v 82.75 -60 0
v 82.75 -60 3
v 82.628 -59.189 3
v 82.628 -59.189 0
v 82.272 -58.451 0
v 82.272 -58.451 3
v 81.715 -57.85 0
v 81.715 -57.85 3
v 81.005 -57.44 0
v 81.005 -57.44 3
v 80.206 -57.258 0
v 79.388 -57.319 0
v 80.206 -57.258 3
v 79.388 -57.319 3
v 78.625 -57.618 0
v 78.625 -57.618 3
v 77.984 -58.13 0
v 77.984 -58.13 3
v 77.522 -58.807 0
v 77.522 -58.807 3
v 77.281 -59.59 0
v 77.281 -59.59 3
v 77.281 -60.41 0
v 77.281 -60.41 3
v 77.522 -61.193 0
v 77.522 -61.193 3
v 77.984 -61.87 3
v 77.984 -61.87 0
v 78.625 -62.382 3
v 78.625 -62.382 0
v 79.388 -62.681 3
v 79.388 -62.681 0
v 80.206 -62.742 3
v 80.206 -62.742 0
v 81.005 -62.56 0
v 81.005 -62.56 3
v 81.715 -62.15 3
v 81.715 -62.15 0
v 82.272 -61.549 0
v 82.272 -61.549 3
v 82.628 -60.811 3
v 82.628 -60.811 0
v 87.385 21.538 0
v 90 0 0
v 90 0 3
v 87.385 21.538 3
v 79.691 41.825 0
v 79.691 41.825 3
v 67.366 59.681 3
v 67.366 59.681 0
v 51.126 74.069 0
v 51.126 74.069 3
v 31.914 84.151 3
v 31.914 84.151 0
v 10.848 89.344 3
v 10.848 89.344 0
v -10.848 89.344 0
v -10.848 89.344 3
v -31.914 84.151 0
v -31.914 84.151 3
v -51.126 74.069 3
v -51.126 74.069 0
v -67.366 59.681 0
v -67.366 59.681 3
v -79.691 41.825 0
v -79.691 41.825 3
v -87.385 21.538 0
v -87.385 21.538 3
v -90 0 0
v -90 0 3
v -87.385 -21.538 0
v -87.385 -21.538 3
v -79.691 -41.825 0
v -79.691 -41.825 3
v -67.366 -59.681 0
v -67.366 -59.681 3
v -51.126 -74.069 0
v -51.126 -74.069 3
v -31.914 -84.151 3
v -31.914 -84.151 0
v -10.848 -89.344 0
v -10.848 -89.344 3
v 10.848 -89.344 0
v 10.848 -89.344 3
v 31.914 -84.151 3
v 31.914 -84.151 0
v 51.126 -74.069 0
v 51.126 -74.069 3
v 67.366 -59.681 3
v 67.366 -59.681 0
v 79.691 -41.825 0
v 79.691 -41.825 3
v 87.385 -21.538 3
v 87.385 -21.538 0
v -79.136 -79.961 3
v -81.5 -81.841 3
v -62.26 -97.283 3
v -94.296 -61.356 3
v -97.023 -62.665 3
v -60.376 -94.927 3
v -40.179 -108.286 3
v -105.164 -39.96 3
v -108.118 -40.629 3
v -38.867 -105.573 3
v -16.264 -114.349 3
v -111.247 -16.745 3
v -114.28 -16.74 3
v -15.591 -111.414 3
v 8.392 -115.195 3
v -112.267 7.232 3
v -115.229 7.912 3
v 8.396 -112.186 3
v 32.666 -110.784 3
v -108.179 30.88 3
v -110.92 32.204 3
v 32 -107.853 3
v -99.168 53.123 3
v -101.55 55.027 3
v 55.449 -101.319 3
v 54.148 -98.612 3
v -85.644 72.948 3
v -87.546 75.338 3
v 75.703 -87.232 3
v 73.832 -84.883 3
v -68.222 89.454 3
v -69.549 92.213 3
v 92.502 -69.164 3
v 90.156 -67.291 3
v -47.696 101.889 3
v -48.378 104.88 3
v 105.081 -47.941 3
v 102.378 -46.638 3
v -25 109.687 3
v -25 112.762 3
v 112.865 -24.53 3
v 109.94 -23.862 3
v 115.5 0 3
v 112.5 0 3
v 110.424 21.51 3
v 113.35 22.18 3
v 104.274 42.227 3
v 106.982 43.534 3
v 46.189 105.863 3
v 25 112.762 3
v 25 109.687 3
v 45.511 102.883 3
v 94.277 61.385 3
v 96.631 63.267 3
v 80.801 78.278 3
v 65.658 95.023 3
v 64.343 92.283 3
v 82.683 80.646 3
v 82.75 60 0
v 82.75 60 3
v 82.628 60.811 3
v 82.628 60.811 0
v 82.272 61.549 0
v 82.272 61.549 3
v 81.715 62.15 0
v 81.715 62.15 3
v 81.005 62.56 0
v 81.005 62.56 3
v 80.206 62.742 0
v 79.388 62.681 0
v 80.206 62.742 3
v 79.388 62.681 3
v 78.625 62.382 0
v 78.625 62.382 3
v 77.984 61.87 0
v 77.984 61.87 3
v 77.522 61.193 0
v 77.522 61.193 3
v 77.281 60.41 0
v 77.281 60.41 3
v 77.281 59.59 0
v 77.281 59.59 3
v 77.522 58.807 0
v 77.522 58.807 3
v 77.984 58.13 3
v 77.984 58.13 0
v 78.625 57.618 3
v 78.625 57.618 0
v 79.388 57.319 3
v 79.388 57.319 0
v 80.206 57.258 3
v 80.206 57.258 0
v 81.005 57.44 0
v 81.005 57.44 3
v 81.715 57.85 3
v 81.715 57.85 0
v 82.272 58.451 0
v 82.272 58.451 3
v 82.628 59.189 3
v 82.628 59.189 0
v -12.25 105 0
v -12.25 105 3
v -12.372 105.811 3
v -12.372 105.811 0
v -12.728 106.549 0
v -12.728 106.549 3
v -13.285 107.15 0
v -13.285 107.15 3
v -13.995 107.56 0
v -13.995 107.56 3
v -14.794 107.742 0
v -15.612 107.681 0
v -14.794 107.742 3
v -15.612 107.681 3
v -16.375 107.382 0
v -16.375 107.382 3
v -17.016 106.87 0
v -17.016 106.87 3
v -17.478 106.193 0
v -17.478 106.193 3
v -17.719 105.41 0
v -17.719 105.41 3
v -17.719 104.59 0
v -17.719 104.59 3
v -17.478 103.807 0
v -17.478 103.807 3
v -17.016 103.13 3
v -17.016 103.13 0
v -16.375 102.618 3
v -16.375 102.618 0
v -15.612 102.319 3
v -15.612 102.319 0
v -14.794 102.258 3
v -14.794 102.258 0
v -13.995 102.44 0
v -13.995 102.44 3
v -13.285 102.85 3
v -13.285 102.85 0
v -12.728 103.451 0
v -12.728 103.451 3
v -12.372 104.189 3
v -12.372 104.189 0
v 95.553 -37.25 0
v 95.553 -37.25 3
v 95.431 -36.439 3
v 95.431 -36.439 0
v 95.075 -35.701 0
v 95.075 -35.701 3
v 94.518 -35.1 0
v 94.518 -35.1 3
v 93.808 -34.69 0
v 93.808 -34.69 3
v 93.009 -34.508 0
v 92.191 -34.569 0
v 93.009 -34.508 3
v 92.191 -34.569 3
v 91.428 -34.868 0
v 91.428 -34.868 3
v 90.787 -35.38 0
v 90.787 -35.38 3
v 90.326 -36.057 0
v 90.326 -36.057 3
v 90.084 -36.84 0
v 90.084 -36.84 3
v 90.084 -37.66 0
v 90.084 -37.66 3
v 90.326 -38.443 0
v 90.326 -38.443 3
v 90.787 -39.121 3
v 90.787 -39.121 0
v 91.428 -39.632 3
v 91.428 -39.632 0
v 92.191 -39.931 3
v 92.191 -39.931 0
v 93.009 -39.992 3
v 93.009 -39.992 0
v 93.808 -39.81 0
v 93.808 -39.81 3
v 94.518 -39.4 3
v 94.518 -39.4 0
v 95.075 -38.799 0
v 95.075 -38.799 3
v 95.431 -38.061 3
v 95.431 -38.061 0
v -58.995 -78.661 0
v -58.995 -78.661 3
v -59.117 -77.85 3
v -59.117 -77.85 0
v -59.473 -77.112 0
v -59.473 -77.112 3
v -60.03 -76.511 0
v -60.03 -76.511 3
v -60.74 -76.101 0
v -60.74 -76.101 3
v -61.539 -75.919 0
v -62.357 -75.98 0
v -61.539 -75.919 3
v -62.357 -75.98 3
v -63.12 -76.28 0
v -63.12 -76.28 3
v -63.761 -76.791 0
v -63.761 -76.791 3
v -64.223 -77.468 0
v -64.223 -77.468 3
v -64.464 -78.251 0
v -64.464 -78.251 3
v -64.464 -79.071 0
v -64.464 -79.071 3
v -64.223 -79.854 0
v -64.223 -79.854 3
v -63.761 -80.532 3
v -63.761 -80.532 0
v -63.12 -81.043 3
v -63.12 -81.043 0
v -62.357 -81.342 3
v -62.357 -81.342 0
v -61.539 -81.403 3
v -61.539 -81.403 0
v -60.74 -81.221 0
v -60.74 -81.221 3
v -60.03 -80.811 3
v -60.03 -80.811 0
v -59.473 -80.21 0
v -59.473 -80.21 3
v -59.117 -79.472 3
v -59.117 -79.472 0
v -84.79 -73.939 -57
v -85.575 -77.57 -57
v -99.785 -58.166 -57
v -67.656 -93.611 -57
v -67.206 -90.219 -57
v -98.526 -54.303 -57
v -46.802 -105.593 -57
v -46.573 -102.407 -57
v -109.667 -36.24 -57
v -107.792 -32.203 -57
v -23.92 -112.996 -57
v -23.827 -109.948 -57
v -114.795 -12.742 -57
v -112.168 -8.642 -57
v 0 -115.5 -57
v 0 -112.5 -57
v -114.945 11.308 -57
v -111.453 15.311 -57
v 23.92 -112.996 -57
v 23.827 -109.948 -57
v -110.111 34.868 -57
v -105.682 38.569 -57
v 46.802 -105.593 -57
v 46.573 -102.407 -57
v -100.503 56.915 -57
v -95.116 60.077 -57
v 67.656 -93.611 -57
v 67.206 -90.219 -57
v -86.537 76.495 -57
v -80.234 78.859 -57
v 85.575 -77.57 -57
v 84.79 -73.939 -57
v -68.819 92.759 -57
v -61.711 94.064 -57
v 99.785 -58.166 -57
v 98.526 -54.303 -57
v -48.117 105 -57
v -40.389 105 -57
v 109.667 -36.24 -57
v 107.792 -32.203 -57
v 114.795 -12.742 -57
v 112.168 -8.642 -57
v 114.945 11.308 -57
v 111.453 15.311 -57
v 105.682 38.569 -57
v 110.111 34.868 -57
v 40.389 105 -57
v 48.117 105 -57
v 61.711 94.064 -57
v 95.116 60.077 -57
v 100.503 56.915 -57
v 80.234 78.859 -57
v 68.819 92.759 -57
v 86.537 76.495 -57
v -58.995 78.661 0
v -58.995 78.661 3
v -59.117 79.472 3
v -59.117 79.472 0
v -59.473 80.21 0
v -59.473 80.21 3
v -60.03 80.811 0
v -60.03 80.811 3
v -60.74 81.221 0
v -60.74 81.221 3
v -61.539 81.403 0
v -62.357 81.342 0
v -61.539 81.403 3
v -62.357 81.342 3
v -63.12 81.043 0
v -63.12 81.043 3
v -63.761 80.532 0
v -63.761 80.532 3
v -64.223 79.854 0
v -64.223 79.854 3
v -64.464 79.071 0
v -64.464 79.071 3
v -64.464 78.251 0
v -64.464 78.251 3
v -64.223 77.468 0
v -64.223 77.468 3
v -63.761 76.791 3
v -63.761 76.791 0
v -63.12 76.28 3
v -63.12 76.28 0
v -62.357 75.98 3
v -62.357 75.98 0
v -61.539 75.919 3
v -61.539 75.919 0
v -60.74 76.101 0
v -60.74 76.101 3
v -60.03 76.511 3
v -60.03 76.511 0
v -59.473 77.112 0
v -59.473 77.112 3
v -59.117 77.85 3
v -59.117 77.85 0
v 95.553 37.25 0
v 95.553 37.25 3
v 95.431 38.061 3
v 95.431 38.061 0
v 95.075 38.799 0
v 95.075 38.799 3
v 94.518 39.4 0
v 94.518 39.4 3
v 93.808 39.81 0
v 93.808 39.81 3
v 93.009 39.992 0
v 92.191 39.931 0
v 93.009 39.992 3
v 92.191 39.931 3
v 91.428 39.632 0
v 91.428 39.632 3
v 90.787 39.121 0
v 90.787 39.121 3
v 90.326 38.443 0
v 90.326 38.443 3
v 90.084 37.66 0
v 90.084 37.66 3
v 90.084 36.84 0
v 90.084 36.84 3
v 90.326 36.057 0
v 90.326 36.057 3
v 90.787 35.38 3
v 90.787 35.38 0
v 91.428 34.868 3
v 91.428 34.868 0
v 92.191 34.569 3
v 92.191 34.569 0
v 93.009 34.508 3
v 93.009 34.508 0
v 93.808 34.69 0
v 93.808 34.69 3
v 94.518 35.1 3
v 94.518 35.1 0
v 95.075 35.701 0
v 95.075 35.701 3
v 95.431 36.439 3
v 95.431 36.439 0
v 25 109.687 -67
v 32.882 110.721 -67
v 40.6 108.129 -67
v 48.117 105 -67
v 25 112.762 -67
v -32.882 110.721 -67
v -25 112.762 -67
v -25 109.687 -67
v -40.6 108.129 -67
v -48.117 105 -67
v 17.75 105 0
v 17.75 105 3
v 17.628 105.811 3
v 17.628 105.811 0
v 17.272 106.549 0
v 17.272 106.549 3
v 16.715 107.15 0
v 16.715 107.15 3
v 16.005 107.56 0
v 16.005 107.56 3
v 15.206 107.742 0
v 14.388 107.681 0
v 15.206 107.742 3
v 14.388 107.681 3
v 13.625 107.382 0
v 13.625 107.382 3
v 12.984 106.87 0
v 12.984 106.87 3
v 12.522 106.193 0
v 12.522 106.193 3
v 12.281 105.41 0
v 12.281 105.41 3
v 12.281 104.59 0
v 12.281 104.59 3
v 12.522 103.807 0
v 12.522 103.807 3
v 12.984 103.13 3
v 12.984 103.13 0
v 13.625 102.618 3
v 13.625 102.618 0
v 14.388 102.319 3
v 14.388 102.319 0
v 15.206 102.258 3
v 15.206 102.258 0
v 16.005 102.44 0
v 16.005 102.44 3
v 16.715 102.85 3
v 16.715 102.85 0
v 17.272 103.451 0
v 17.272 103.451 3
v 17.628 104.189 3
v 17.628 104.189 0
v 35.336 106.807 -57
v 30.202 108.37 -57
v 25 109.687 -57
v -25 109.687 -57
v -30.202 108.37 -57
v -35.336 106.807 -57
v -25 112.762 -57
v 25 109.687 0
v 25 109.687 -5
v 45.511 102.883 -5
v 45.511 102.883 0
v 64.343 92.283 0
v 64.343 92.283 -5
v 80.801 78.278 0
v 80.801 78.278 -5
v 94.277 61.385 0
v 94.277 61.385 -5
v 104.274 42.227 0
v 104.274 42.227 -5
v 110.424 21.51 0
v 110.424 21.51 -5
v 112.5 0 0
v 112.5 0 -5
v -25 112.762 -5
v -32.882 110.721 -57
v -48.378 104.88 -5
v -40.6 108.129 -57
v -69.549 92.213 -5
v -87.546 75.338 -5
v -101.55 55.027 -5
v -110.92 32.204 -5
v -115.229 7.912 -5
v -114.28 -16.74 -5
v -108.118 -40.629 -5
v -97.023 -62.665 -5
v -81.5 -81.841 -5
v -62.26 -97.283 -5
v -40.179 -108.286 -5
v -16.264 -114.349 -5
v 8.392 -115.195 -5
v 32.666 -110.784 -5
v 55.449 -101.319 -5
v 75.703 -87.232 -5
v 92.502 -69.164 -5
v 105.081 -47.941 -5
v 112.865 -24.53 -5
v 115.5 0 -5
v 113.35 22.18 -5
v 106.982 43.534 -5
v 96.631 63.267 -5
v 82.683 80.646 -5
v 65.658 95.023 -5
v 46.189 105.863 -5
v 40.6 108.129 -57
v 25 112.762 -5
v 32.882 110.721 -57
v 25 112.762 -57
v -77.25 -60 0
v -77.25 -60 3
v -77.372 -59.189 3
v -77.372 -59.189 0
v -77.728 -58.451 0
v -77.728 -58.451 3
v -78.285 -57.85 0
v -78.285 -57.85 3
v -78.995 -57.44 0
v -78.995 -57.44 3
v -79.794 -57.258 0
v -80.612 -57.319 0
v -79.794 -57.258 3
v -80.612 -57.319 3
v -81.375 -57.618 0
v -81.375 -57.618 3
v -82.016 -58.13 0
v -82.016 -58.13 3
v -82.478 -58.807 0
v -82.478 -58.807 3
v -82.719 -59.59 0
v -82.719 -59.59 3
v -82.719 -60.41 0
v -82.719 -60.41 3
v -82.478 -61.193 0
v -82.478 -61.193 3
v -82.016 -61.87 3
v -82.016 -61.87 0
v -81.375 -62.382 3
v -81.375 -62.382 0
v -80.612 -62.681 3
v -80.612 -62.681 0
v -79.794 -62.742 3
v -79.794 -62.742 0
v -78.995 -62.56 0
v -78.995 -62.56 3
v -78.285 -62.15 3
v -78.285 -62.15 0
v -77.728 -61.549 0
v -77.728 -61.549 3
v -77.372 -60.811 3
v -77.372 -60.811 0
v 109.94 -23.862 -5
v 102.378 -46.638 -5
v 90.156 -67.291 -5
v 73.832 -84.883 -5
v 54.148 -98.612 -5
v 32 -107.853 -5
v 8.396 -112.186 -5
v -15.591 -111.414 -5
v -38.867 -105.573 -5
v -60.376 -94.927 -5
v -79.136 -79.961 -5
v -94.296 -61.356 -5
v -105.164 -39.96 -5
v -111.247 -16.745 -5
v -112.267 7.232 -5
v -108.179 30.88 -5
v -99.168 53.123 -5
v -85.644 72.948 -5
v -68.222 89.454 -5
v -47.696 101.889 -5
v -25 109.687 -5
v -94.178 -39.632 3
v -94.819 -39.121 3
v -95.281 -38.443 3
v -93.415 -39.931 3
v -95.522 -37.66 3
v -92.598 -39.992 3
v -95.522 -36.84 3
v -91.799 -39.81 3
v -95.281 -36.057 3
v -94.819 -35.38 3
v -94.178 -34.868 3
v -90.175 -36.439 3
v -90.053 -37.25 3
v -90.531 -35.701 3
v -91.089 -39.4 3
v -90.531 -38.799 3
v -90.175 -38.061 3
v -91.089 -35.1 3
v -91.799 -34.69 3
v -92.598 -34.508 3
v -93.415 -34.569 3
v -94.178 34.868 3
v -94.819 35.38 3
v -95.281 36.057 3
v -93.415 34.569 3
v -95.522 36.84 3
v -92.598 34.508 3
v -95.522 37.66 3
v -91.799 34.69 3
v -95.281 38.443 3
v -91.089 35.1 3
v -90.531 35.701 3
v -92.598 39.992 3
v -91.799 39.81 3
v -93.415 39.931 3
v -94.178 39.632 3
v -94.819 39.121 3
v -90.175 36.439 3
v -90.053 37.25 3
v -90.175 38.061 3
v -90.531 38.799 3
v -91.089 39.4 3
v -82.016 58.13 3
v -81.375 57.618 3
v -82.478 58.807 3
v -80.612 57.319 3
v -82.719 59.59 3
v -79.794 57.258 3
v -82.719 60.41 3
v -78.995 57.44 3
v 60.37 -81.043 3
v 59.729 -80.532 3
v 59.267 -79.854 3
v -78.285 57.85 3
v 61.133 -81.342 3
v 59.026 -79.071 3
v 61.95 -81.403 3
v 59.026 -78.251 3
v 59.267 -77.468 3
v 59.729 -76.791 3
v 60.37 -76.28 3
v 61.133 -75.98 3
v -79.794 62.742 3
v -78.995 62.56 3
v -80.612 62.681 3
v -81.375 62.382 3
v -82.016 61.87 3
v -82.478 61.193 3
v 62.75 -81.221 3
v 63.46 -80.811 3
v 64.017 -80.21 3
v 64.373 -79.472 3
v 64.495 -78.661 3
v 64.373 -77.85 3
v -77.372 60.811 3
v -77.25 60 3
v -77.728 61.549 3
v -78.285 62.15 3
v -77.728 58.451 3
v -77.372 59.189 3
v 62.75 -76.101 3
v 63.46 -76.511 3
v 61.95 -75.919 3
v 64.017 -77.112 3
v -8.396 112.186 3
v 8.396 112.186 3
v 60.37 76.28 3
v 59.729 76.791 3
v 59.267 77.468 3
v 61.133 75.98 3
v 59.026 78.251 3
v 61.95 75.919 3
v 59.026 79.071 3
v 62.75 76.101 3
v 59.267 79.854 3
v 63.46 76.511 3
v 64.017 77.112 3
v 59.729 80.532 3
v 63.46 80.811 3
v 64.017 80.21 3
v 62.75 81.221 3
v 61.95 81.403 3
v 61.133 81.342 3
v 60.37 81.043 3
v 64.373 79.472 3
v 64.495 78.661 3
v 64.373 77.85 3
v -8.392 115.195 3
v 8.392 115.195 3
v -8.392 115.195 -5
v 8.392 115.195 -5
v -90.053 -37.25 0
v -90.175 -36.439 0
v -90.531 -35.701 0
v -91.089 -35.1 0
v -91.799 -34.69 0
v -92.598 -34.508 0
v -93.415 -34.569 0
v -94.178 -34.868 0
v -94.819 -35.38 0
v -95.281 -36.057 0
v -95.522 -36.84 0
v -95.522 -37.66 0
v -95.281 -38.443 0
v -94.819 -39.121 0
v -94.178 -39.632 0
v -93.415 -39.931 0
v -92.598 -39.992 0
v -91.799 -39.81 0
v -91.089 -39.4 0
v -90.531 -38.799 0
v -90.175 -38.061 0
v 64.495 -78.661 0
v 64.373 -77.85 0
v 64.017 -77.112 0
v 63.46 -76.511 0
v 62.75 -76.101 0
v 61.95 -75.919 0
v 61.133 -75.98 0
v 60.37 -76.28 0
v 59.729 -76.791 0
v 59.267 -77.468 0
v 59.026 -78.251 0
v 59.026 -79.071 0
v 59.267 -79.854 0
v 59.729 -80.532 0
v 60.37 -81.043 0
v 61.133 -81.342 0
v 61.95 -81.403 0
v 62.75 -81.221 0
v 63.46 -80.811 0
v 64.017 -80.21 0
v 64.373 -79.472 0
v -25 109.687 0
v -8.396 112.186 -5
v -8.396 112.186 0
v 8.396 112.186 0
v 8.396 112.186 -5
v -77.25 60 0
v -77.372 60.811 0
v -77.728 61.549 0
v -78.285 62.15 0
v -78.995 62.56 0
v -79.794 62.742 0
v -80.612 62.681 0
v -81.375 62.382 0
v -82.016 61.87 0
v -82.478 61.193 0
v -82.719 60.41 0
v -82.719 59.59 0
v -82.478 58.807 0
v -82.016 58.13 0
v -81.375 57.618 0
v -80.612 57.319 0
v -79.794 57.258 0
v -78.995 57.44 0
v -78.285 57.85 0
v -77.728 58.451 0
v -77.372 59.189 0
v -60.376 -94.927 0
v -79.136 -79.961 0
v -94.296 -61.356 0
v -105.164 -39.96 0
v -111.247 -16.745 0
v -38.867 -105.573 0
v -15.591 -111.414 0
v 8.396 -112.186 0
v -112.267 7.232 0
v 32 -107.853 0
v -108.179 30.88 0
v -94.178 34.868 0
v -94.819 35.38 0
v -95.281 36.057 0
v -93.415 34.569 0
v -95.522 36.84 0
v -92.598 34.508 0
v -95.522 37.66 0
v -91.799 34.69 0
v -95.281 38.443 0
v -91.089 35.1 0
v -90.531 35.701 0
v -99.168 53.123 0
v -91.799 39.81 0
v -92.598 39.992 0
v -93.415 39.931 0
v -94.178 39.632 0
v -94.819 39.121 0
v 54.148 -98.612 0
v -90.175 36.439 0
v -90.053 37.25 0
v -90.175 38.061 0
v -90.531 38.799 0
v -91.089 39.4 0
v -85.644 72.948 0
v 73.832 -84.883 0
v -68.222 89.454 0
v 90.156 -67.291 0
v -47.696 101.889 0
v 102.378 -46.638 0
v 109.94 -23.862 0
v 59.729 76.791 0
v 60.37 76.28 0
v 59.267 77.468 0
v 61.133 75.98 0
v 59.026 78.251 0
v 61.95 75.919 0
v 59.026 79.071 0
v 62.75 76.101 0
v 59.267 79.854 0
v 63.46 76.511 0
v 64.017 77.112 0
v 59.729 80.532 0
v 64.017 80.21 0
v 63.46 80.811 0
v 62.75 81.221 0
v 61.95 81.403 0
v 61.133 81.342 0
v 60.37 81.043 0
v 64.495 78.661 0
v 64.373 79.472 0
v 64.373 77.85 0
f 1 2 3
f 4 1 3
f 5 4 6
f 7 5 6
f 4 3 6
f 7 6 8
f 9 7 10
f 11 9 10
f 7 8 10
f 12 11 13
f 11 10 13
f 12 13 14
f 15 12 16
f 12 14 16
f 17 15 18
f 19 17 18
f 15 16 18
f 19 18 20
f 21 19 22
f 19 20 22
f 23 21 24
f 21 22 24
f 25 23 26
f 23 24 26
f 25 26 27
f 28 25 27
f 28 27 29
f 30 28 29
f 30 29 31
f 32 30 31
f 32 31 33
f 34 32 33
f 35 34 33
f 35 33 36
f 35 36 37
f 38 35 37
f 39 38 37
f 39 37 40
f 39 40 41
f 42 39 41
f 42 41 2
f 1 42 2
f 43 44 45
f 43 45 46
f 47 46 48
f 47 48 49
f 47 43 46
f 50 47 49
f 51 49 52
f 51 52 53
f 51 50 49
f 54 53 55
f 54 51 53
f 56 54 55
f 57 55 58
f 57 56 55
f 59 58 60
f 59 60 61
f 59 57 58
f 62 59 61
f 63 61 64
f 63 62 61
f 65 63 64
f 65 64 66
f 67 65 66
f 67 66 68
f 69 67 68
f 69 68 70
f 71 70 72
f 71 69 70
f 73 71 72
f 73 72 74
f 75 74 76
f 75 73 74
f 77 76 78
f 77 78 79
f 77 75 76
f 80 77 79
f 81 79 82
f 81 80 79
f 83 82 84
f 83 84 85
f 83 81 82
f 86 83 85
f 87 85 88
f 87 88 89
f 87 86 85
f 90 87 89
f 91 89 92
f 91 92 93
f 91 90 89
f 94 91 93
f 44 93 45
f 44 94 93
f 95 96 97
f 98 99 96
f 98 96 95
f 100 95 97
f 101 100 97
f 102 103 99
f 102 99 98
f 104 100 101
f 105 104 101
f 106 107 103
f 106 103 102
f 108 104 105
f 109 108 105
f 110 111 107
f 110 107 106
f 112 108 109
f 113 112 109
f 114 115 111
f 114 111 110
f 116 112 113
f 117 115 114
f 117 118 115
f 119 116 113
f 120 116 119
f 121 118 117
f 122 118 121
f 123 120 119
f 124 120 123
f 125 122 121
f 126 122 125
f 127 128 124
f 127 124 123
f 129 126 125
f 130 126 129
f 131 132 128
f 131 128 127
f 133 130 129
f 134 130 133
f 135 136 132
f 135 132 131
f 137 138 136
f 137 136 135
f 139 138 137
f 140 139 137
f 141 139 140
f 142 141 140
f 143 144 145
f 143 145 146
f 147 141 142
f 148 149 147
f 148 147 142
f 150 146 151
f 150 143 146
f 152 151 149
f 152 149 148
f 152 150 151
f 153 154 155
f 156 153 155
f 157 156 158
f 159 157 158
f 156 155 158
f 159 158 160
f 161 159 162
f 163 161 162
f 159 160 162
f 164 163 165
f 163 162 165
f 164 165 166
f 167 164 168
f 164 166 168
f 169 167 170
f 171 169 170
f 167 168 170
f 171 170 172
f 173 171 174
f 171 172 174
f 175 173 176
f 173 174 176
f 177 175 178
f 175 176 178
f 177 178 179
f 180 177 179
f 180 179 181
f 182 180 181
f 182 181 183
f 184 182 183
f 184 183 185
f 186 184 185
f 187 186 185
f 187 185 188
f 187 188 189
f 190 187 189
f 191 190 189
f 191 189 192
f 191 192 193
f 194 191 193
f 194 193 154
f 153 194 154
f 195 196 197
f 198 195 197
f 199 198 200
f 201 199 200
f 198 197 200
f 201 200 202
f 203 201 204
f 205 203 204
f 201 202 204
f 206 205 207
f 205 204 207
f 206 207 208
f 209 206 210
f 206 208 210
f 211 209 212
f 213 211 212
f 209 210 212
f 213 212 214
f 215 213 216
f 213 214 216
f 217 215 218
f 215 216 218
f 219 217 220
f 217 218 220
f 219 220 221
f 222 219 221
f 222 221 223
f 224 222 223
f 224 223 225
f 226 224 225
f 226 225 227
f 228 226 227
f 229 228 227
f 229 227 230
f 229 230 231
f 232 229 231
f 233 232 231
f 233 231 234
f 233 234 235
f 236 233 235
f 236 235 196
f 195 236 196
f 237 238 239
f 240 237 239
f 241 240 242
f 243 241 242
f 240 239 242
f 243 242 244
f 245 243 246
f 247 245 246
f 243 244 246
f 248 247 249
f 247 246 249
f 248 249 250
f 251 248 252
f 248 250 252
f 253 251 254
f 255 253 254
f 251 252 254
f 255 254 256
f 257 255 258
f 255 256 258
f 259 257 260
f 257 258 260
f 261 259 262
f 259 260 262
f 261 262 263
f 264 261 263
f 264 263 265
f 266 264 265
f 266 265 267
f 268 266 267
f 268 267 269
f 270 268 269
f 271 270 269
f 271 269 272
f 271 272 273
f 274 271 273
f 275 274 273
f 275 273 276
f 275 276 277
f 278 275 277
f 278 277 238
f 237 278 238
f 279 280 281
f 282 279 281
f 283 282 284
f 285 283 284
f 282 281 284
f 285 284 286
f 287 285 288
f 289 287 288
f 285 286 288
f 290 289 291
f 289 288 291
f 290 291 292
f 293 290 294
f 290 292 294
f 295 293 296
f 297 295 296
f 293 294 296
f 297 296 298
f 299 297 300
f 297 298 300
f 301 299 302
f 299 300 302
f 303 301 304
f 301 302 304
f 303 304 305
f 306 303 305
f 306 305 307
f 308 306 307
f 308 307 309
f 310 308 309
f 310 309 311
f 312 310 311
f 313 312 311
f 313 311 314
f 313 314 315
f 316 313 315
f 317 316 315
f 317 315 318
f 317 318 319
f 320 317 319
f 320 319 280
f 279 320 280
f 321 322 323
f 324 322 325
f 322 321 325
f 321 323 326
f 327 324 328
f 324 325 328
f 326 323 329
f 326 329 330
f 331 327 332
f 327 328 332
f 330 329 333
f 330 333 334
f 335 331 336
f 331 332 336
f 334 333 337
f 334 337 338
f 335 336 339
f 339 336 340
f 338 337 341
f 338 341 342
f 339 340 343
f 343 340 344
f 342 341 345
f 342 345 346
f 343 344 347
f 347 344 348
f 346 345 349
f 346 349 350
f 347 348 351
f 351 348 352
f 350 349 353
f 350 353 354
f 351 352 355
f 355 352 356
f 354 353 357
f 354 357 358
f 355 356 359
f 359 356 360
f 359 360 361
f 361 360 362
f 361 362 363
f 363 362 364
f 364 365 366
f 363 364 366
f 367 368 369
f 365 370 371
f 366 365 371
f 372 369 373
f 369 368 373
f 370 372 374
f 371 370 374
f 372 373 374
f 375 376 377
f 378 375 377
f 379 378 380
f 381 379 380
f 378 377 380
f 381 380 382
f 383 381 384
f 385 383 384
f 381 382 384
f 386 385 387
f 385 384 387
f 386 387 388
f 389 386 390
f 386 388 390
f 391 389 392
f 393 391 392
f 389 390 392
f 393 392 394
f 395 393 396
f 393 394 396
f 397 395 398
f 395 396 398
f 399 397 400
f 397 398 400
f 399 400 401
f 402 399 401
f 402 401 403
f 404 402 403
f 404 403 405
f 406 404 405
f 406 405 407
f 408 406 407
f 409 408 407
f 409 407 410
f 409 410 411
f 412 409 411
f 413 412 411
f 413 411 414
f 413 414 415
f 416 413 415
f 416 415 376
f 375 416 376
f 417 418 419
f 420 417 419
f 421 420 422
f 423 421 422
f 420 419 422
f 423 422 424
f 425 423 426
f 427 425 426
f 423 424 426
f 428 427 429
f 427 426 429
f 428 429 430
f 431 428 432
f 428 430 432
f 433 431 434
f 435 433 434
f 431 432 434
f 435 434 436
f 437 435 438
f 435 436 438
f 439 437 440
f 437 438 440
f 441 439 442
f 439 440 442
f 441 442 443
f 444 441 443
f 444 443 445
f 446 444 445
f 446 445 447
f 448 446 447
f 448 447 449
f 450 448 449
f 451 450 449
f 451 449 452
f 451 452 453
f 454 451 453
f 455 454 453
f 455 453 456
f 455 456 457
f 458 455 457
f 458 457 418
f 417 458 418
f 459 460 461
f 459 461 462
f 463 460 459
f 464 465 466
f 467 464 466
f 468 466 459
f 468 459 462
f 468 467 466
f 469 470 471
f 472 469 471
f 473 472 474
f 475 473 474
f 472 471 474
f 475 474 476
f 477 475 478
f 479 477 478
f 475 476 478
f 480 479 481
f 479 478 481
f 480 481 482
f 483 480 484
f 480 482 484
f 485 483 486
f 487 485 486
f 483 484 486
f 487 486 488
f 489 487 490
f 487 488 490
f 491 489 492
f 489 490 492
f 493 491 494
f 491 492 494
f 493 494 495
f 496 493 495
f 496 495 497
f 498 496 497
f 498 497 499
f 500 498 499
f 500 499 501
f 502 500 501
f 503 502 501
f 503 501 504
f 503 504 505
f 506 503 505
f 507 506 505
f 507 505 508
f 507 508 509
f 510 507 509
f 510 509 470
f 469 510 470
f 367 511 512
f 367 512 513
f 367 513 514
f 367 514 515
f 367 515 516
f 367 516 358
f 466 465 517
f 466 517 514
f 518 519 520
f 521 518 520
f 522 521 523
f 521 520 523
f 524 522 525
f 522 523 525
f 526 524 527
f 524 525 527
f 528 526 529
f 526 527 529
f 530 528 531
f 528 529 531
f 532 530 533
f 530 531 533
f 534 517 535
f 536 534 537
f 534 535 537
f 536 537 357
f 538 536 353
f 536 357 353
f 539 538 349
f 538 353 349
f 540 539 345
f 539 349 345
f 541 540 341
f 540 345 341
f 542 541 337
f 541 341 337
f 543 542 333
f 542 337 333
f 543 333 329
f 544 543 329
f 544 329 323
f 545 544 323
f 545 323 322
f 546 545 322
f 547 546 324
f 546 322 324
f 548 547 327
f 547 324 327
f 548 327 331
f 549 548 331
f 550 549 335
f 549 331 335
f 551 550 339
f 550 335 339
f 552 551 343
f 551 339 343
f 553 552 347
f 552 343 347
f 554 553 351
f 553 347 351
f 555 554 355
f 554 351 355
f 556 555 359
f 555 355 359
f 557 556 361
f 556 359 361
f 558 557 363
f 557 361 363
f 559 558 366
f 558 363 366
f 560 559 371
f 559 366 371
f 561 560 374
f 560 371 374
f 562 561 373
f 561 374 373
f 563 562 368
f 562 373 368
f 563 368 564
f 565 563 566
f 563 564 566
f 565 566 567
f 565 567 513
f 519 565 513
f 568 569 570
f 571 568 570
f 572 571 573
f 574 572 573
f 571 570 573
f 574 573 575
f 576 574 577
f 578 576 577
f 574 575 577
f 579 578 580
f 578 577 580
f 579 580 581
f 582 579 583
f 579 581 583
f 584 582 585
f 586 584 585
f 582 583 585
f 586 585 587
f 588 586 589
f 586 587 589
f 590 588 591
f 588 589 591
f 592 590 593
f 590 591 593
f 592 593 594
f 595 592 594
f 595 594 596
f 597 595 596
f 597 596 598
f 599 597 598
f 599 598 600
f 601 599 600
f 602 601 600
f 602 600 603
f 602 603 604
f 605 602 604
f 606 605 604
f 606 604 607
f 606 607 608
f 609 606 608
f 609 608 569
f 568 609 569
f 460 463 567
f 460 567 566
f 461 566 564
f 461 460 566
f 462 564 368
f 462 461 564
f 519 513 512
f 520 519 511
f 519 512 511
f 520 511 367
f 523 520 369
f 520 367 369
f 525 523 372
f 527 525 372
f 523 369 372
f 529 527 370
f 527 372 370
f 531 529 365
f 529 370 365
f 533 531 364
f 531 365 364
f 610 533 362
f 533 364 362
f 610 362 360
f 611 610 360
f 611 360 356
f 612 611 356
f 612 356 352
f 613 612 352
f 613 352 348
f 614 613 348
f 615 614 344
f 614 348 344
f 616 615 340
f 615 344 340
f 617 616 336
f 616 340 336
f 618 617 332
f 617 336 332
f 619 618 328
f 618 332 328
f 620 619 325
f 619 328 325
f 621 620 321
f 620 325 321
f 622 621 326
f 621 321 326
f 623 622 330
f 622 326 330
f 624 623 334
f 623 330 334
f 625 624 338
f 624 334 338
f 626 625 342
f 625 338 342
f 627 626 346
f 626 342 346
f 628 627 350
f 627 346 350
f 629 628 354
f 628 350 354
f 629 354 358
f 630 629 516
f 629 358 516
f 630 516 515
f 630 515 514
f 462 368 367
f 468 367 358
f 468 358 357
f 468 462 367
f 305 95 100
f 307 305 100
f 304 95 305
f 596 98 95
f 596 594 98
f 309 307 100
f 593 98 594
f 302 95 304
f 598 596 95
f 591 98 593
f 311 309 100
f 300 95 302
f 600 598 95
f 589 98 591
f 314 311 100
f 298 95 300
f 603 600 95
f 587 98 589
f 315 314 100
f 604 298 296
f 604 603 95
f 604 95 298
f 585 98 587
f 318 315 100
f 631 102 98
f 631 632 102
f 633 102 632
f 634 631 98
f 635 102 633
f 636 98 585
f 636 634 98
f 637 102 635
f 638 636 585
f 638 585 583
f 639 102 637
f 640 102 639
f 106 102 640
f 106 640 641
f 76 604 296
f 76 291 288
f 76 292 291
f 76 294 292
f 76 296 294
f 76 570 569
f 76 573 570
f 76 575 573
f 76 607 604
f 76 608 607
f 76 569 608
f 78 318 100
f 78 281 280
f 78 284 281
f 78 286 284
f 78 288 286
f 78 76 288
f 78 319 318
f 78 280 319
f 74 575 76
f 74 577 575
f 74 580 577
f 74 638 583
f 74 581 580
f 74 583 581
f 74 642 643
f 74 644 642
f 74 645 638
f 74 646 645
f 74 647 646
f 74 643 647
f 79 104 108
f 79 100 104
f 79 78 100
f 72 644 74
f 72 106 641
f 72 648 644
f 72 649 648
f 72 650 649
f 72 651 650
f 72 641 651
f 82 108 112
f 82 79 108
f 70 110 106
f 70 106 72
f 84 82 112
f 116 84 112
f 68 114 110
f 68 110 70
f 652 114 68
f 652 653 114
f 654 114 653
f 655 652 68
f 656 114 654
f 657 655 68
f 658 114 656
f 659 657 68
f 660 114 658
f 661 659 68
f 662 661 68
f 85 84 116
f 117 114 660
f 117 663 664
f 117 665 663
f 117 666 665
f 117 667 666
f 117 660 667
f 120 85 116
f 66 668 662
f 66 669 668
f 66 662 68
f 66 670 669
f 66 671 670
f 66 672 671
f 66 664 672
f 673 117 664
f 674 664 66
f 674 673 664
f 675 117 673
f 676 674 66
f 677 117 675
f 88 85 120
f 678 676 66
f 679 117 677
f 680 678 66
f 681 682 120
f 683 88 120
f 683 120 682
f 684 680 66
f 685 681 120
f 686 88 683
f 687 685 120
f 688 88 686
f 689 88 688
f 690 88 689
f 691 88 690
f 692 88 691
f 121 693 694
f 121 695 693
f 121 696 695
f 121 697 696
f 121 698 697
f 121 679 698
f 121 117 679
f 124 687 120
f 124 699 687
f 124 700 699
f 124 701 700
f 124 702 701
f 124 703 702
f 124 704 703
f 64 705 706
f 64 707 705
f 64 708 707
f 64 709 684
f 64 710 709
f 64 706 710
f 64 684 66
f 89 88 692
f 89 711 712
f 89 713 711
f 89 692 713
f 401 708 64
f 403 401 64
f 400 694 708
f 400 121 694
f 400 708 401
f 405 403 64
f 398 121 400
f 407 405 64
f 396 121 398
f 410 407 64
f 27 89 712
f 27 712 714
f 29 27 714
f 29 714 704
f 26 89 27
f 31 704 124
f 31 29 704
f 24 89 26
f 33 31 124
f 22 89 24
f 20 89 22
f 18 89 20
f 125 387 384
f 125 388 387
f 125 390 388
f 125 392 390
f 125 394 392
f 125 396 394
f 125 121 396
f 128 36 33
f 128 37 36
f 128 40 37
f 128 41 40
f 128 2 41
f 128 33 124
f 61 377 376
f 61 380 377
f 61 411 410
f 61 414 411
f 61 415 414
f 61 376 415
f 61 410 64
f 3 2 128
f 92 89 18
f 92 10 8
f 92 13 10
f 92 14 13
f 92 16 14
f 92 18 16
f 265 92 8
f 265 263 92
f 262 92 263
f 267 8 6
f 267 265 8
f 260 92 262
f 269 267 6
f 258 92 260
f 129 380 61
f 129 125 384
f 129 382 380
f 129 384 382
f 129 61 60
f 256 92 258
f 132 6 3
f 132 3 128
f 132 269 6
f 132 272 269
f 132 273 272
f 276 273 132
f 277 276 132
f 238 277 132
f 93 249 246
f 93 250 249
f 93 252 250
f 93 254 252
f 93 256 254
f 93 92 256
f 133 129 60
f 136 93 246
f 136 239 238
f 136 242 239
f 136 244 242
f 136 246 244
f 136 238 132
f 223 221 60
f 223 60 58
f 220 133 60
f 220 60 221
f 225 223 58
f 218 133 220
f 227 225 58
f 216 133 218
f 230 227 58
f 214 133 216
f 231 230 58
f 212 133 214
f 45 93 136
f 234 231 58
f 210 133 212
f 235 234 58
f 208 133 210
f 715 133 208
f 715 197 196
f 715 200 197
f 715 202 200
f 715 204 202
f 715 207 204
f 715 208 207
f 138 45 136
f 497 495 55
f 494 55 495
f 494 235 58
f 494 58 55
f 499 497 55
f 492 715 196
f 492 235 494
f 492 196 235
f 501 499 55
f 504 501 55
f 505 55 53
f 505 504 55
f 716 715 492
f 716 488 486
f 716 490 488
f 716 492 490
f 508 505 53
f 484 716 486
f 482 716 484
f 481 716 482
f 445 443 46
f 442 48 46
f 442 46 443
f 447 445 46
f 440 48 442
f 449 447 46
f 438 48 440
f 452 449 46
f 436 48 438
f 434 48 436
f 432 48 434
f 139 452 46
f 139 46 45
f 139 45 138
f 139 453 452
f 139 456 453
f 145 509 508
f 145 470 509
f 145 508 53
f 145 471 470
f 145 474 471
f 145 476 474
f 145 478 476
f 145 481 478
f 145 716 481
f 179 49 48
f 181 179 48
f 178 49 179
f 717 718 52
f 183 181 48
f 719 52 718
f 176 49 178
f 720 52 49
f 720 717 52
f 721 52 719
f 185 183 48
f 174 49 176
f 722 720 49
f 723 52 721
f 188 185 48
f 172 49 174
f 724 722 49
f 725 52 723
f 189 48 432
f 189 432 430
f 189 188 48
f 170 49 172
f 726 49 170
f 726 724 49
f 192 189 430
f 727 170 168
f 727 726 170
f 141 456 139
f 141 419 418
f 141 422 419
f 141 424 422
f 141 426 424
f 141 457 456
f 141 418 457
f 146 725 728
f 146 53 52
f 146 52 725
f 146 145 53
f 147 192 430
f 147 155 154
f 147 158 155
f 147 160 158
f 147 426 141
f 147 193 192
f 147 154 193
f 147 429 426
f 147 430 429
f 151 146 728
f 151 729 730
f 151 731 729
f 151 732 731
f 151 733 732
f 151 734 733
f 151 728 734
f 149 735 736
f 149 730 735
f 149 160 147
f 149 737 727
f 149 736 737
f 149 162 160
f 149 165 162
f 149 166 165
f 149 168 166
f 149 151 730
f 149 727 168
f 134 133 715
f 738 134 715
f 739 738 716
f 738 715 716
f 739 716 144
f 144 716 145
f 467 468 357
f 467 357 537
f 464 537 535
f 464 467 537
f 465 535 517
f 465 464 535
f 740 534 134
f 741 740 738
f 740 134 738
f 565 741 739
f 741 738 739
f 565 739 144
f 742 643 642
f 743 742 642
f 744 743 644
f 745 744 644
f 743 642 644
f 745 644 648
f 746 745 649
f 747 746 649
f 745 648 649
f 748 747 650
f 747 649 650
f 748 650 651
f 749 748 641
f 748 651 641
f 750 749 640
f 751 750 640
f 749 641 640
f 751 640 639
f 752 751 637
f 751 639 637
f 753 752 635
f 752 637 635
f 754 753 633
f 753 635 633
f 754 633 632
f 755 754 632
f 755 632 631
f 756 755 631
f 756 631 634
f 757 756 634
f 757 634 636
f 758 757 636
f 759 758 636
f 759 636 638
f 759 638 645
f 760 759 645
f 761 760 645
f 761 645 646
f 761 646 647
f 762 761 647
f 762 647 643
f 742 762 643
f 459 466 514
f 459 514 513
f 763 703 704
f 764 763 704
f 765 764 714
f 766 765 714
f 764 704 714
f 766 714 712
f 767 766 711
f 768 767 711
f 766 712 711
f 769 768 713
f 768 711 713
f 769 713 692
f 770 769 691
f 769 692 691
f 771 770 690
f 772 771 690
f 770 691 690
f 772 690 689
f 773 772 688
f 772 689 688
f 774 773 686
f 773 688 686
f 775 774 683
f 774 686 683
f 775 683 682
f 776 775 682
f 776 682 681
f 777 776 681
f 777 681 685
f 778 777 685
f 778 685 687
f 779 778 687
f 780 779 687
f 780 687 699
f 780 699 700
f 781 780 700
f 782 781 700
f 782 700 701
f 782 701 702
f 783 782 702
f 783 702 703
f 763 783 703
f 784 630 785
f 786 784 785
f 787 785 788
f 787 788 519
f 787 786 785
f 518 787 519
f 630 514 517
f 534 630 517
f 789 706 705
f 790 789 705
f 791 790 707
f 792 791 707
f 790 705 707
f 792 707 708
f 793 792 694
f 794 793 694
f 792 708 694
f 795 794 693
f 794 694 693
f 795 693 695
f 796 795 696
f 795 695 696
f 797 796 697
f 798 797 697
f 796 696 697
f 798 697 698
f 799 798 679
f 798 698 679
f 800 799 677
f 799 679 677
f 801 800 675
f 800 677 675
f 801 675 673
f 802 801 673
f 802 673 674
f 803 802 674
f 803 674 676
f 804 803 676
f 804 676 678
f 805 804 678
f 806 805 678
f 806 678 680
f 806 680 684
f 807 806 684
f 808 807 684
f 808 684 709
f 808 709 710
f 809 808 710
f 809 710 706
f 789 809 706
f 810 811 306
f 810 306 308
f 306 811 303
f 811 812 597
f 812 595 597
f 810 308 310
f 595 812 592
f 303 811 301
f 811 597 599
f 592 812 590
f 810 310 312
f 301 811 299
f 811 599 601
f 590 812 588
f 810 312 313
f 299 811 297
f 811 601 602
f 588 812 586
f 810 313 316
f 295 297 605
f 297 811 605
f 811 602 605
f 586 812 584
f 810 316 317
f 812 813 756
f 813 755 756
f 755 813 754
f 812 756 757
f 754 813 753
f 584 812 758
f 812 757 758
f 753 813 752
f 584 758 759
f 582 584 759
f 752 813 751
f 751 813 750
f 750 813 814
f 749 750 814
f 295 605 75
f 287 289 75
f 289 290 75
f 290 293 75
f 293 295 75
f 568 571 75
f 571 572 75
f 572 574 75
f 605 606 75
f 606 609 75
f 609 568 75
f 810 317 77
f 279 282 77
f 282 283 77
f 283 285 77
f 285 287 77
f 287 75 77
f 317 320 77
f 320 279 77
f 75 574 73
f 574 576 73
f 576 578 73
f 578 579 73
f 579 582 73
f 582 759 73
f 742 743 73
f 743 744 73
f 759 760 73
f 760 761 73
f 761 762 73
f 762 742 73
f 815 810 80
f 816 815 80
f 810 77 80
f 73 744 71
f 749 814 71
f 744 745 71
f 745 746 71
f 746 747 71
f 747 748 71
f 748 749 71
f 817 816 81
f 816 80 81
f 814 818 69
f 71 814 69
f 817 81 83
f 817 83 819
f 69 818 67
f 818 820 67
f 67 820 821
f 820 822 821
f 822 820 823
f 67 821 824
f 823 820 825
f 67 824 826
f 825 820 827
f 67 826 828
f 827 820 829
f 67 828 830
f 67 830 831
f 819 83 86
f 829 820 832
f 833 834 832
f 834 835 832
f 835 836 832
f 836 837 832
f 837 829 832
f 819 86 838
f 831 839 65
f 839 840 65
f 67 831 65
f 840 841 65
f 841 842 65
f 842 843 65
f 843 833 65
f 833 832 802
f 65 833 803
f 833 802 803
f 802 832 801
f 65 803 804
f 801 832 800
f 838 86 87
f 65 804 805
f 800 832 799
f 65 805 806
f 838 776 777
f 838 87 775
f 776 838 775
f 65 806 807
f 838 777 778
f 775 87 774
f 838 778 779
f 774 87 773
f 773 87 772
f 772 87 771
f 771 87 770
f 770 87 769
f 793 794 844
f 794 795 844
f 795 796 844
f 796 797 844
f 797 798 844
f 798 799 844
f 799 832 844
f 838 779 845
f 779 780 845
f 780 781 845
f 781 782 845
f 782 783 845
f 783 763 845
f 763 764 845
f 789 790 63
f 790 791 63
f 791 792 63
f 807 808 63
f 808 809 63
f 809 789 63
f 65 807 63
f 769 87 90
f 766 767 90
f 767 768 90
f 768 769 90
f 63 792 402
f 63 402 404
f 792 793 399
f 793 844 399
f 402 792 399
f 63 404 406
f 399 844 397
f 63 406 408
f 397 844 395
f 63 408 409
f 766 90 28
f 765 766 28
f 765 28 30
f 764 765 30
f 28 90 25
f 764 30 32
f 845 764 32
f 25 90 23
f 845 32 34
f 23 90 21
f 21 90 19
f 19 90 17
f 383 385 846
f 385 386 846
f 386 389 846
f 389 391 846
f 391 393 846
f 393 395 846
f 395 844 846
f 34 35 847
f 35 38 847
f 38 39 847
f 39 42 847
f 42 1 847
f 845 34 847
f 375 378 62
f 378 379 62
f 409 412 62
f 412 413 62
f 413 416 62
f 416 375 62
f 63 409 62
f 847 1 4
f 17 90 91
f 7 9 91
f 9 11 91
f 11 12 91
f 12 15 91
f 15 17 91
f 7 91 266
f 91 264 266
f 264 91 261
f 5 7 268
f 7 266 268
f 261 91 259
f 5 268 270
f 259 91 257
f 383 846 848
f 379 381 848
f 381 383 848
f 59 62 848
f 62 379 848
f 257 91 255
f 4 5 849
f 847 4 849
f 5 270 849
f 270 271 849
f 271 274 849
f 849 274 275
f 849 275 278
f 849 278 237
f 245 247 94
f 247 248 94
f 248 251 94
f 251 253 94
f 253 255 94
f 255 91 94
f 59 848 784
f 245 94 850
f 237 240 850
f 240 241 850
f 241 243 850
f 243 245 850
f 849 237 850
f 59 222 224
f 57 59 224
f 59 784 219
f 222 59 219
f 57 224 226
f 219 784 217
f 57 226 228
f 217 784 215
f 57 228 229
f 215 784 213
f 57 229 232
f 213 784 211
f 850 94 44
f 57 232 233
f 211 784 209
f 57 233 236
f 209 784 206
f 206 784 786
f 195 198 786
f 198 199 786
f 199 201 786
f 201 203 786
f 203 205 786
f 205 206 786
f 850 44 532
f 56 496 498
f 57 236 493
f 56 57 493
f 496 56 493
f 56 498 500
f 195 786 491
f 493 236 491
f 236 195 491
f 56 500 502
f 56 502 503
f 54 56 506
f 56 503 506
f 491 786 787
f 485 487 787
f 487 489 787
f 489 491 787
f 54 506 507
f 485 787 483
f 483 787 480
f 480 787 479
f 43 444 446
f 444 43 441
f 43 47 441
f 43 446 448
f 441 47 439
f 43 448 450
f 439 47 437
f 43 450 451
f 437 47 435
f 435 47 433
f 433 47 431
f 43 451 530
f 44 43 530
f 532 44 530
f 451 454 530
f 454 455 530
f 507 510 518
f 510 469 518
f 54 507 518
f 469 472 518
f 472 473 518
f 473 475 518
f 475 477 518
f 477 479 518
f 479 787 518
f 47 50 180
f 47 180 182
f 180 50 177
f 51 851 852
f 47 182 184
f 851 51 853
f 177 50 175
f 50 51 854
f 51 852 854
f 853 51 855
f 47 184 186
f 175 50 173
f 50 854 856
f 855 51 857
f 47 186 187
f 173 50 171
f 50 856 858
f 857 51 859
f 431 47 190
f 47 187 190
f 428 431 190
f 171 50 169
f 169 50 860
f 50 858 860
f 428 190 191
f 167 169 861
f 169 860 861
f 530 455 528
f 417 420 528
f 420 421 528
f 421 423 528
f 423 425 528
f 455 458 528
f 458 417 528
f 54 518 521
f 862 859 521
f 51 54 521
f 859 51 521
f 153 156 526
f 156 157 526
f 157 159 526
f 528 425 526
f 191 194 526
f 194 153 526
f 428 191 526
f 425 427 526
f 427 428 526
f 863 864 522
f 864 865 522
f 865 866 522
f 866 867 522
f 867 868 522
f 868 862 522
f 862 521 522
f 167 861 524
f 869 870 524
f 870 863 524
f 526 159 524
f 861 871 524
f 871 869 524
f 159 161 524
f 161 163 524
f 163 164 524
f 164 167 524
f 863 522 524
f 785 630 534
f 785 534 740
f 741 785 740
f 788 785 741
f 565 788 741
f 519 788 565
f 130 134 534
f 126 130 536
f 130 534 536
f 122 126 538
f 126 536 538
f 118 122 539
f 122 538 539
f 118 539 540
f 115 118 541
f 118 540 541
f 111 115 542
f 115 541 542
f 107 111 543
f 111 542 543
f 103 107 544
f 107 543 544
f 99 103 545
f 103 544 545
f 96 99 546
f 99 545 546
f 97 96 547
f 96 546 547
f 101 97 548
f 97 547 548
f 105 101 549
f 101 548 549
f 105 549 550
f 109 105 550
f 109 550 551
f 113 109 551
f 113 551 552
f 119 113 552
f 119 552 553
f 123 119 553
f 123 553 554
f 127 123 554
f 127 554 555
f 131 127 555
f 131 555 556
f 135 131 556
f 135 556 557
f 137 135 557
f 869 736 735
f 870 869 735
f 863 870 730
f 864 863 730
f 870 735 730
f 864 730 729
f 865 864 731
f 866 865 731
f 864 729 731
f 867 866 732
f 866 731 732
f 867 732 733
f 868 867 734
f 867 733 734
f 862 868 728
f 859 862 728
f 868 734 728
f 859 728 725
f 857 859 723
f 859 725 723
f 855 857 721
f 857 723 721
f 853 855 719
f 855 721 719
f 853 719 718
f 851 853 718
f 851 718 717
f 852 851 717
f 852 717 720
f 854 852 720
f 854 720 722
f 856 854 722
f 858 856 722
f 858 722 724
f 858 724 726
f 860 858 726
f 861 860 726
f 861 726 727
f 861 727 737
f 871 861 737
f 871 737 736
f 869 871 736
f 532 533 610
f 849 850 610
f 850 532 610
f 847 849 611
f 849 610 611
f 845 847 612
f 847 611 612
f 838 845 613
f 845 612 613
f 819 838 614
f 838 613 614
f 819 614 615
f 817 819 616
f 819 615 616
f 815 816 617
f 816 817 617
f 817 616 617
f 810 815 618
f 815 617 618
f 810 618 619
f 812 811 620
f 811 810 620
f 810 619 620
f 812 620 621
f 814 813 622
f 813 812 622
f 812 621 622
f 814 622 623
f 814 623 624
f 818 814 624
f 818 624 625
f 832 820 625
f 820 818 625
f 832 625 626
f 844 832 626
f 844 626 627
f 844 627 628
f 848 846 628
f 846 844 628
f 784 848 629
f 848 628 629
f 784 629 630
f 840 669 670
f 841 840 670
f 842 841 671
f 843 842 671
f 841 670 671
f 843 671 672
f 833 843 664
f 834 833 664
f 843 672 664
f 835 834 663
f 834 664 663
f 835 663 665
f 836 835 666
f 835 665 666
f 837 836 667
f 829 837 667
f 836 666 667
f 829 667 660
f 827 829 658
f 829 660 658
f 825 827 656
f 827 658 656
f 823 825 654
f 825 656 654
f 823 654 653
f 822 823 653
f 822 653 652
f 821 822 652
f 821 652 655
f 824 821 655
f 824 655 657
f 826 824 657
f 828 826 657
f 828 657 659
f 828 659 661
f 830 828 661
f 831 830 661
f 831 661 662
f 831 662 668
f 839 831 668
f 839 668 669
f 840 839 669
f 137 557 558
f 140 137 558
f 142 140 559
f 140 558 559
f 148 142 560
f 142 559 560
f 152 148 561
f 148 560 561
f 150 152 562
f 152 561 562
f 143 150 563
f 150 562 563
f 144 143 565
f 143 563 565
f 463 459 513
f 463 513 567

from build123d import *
from build123d.topology import SkipClean

# Parameters (mm, degrees)
SKETCH_1_R           = 112.5
SKETCH_1_R_2         = 90
EXTRUDE_1_DEPTH      = 3
EXTRUDE_START        = -60
EXTRUDE_2_DEPTH      = 60
SKETCH_5_R           = 2.75
CUT_EXTRUDE_1_DEPTH  = 10
EXTRUDE_3_DEPTH      = 5
EXTRUDE_3_DEPTH_BACK = 3
SKETCH_6_R           = 115.5
SKETCH_6_R_2         = 112.5
EXTRUDE_START_2      = 10
EXTRUDE_4_DEPTH      = 10


with BuildPart() as part:
    # 草图1 → 凸台-拉伸1 (new body)
    with BuildSketch(Plane.XY):
        Circle(SKETCH_1_R)
        Circle(SKETCH_1_R_2, mode=Mode.SUBTRACT)
    extrude(amount=EXTRUDE_1_DEPTH)

    # 草图4 → 凸台-拉伸2 (add)
    with BuildSketch(Plane.XY.offset(3).offset(EXTRUDE_START)):
        with BuildLine():
            Line((-25, 109.687054842), (-25, 112.76191733))
            ThreePointArc((-25, 112.76191733), (0, -115.5), (25, 112.76191733))
            Line((25, 112.76191733), (25, 109.687054842))
            ThreePointArc((25, 109.687054842), (0, -112.5), (-25, 109.687054842))
        make_face()
    extrude(amount=EXTRUDE_2_DEPTH)

    # 草图5 → 切除-拉伸1 (cut)
    with BuildSketch(Plane.XY.offset(3)):
        with Locations((80, 60)):
            Circle(SKETCH_5_R)
        with Locations((92.803208809, 37.250025969)):
            Circle(SKETCH_5_R)
        with Locations((61.744923397, 78.661073186)):
            Circle(SKETCH_5_R)
        with Locations((61.744923397, -78.661073186)):
            Circle(SKETCH_5_R)
        with Locations((92.803208809, -37.250025969)):
            Circle(SKETCH_5_R)
        with Locations((80, -60)):
            Circle(SKETCH_5_R)
        with Locations((-80, -60)):
            Circle(SKETCH_5_R)
        with Locations((-92.803208809, -37.250025969)):
            Circle(SKETCH_5_R)
        with Locations((-61.744923397, -78.661073186)):
            Circle(SKETCH_5_R)
        with Locations((-61.744923397, 78.661073186)):
            Circle(SKETCH_5_R)
        with Locations((-92.803208809, 37.250025969)):
            Circle(SKETCH_5_R)
        with Locations((-80, 60)):
            Circle(SKETCH_5_R)
        with Locations((15, 105)):
            Circle(SKETCH_5_R)
        with Locations((-15, 105)):
            Circle(SKETCH_5_R)
    extrude(amount=-CUT_EXTRUDE_1_DEPTH, mode=Mode.SUBTRACT)

    # 草图6 → 凸台-拉伸3 (add, two sides: drawn at the far end of the back side and taken through both)
    with SkipClean():  # the faces are left unmerged after this step: merging them gives an invalid solid
        with BuildSketch(Plane(origin=(0, 0, 0), x_dir=(-1, 0, 0), z_dir=(0, 0, -1)).offset(-EXTRUDE_3_DEPTH_BACK)):
            Circle(SKETCH_6_R)
            Circle(SKETCH_6_R_2, mode=Mode.SUBTRACT)
        extrude(amount=EXTRUDE_3_DEPTH + EXTRUDE_3_DEPTH_BACK)

    # 草图7 → 凸台-拉伸4 (add)
    with SkipClean():  # the faces are left unmerged after this step: merging them gives an invalid solid
        with BuildSketch(Plane(origin=(0, 0, -57), x_dir=(-1, 0, 0), z_dir=(0, 0, -1)).offset(EXTRUDE_START_2)):
            with BuildLine():
                Line((-48.117044797, 105), (48.117044797, 105))
                ThreePointArc((48.117044797, 105), (36.763941575, 109.492751358), (25, 112.76191733))
                Line((25, 112.76191733), (25, 109.687054842))
                Line((25, 109.687054842), (-25, 109.687054842))
                Line((-25, 109.687054842), (-25, 112.76191733))
                ThreePointArc((-25, 112.76191733), (-36.763941575, 109.492751358), (-48.117044797, 105))
            make_face()
        extrude(amount=-EXTRUDE_4_DEPTH)


solid = part.part
